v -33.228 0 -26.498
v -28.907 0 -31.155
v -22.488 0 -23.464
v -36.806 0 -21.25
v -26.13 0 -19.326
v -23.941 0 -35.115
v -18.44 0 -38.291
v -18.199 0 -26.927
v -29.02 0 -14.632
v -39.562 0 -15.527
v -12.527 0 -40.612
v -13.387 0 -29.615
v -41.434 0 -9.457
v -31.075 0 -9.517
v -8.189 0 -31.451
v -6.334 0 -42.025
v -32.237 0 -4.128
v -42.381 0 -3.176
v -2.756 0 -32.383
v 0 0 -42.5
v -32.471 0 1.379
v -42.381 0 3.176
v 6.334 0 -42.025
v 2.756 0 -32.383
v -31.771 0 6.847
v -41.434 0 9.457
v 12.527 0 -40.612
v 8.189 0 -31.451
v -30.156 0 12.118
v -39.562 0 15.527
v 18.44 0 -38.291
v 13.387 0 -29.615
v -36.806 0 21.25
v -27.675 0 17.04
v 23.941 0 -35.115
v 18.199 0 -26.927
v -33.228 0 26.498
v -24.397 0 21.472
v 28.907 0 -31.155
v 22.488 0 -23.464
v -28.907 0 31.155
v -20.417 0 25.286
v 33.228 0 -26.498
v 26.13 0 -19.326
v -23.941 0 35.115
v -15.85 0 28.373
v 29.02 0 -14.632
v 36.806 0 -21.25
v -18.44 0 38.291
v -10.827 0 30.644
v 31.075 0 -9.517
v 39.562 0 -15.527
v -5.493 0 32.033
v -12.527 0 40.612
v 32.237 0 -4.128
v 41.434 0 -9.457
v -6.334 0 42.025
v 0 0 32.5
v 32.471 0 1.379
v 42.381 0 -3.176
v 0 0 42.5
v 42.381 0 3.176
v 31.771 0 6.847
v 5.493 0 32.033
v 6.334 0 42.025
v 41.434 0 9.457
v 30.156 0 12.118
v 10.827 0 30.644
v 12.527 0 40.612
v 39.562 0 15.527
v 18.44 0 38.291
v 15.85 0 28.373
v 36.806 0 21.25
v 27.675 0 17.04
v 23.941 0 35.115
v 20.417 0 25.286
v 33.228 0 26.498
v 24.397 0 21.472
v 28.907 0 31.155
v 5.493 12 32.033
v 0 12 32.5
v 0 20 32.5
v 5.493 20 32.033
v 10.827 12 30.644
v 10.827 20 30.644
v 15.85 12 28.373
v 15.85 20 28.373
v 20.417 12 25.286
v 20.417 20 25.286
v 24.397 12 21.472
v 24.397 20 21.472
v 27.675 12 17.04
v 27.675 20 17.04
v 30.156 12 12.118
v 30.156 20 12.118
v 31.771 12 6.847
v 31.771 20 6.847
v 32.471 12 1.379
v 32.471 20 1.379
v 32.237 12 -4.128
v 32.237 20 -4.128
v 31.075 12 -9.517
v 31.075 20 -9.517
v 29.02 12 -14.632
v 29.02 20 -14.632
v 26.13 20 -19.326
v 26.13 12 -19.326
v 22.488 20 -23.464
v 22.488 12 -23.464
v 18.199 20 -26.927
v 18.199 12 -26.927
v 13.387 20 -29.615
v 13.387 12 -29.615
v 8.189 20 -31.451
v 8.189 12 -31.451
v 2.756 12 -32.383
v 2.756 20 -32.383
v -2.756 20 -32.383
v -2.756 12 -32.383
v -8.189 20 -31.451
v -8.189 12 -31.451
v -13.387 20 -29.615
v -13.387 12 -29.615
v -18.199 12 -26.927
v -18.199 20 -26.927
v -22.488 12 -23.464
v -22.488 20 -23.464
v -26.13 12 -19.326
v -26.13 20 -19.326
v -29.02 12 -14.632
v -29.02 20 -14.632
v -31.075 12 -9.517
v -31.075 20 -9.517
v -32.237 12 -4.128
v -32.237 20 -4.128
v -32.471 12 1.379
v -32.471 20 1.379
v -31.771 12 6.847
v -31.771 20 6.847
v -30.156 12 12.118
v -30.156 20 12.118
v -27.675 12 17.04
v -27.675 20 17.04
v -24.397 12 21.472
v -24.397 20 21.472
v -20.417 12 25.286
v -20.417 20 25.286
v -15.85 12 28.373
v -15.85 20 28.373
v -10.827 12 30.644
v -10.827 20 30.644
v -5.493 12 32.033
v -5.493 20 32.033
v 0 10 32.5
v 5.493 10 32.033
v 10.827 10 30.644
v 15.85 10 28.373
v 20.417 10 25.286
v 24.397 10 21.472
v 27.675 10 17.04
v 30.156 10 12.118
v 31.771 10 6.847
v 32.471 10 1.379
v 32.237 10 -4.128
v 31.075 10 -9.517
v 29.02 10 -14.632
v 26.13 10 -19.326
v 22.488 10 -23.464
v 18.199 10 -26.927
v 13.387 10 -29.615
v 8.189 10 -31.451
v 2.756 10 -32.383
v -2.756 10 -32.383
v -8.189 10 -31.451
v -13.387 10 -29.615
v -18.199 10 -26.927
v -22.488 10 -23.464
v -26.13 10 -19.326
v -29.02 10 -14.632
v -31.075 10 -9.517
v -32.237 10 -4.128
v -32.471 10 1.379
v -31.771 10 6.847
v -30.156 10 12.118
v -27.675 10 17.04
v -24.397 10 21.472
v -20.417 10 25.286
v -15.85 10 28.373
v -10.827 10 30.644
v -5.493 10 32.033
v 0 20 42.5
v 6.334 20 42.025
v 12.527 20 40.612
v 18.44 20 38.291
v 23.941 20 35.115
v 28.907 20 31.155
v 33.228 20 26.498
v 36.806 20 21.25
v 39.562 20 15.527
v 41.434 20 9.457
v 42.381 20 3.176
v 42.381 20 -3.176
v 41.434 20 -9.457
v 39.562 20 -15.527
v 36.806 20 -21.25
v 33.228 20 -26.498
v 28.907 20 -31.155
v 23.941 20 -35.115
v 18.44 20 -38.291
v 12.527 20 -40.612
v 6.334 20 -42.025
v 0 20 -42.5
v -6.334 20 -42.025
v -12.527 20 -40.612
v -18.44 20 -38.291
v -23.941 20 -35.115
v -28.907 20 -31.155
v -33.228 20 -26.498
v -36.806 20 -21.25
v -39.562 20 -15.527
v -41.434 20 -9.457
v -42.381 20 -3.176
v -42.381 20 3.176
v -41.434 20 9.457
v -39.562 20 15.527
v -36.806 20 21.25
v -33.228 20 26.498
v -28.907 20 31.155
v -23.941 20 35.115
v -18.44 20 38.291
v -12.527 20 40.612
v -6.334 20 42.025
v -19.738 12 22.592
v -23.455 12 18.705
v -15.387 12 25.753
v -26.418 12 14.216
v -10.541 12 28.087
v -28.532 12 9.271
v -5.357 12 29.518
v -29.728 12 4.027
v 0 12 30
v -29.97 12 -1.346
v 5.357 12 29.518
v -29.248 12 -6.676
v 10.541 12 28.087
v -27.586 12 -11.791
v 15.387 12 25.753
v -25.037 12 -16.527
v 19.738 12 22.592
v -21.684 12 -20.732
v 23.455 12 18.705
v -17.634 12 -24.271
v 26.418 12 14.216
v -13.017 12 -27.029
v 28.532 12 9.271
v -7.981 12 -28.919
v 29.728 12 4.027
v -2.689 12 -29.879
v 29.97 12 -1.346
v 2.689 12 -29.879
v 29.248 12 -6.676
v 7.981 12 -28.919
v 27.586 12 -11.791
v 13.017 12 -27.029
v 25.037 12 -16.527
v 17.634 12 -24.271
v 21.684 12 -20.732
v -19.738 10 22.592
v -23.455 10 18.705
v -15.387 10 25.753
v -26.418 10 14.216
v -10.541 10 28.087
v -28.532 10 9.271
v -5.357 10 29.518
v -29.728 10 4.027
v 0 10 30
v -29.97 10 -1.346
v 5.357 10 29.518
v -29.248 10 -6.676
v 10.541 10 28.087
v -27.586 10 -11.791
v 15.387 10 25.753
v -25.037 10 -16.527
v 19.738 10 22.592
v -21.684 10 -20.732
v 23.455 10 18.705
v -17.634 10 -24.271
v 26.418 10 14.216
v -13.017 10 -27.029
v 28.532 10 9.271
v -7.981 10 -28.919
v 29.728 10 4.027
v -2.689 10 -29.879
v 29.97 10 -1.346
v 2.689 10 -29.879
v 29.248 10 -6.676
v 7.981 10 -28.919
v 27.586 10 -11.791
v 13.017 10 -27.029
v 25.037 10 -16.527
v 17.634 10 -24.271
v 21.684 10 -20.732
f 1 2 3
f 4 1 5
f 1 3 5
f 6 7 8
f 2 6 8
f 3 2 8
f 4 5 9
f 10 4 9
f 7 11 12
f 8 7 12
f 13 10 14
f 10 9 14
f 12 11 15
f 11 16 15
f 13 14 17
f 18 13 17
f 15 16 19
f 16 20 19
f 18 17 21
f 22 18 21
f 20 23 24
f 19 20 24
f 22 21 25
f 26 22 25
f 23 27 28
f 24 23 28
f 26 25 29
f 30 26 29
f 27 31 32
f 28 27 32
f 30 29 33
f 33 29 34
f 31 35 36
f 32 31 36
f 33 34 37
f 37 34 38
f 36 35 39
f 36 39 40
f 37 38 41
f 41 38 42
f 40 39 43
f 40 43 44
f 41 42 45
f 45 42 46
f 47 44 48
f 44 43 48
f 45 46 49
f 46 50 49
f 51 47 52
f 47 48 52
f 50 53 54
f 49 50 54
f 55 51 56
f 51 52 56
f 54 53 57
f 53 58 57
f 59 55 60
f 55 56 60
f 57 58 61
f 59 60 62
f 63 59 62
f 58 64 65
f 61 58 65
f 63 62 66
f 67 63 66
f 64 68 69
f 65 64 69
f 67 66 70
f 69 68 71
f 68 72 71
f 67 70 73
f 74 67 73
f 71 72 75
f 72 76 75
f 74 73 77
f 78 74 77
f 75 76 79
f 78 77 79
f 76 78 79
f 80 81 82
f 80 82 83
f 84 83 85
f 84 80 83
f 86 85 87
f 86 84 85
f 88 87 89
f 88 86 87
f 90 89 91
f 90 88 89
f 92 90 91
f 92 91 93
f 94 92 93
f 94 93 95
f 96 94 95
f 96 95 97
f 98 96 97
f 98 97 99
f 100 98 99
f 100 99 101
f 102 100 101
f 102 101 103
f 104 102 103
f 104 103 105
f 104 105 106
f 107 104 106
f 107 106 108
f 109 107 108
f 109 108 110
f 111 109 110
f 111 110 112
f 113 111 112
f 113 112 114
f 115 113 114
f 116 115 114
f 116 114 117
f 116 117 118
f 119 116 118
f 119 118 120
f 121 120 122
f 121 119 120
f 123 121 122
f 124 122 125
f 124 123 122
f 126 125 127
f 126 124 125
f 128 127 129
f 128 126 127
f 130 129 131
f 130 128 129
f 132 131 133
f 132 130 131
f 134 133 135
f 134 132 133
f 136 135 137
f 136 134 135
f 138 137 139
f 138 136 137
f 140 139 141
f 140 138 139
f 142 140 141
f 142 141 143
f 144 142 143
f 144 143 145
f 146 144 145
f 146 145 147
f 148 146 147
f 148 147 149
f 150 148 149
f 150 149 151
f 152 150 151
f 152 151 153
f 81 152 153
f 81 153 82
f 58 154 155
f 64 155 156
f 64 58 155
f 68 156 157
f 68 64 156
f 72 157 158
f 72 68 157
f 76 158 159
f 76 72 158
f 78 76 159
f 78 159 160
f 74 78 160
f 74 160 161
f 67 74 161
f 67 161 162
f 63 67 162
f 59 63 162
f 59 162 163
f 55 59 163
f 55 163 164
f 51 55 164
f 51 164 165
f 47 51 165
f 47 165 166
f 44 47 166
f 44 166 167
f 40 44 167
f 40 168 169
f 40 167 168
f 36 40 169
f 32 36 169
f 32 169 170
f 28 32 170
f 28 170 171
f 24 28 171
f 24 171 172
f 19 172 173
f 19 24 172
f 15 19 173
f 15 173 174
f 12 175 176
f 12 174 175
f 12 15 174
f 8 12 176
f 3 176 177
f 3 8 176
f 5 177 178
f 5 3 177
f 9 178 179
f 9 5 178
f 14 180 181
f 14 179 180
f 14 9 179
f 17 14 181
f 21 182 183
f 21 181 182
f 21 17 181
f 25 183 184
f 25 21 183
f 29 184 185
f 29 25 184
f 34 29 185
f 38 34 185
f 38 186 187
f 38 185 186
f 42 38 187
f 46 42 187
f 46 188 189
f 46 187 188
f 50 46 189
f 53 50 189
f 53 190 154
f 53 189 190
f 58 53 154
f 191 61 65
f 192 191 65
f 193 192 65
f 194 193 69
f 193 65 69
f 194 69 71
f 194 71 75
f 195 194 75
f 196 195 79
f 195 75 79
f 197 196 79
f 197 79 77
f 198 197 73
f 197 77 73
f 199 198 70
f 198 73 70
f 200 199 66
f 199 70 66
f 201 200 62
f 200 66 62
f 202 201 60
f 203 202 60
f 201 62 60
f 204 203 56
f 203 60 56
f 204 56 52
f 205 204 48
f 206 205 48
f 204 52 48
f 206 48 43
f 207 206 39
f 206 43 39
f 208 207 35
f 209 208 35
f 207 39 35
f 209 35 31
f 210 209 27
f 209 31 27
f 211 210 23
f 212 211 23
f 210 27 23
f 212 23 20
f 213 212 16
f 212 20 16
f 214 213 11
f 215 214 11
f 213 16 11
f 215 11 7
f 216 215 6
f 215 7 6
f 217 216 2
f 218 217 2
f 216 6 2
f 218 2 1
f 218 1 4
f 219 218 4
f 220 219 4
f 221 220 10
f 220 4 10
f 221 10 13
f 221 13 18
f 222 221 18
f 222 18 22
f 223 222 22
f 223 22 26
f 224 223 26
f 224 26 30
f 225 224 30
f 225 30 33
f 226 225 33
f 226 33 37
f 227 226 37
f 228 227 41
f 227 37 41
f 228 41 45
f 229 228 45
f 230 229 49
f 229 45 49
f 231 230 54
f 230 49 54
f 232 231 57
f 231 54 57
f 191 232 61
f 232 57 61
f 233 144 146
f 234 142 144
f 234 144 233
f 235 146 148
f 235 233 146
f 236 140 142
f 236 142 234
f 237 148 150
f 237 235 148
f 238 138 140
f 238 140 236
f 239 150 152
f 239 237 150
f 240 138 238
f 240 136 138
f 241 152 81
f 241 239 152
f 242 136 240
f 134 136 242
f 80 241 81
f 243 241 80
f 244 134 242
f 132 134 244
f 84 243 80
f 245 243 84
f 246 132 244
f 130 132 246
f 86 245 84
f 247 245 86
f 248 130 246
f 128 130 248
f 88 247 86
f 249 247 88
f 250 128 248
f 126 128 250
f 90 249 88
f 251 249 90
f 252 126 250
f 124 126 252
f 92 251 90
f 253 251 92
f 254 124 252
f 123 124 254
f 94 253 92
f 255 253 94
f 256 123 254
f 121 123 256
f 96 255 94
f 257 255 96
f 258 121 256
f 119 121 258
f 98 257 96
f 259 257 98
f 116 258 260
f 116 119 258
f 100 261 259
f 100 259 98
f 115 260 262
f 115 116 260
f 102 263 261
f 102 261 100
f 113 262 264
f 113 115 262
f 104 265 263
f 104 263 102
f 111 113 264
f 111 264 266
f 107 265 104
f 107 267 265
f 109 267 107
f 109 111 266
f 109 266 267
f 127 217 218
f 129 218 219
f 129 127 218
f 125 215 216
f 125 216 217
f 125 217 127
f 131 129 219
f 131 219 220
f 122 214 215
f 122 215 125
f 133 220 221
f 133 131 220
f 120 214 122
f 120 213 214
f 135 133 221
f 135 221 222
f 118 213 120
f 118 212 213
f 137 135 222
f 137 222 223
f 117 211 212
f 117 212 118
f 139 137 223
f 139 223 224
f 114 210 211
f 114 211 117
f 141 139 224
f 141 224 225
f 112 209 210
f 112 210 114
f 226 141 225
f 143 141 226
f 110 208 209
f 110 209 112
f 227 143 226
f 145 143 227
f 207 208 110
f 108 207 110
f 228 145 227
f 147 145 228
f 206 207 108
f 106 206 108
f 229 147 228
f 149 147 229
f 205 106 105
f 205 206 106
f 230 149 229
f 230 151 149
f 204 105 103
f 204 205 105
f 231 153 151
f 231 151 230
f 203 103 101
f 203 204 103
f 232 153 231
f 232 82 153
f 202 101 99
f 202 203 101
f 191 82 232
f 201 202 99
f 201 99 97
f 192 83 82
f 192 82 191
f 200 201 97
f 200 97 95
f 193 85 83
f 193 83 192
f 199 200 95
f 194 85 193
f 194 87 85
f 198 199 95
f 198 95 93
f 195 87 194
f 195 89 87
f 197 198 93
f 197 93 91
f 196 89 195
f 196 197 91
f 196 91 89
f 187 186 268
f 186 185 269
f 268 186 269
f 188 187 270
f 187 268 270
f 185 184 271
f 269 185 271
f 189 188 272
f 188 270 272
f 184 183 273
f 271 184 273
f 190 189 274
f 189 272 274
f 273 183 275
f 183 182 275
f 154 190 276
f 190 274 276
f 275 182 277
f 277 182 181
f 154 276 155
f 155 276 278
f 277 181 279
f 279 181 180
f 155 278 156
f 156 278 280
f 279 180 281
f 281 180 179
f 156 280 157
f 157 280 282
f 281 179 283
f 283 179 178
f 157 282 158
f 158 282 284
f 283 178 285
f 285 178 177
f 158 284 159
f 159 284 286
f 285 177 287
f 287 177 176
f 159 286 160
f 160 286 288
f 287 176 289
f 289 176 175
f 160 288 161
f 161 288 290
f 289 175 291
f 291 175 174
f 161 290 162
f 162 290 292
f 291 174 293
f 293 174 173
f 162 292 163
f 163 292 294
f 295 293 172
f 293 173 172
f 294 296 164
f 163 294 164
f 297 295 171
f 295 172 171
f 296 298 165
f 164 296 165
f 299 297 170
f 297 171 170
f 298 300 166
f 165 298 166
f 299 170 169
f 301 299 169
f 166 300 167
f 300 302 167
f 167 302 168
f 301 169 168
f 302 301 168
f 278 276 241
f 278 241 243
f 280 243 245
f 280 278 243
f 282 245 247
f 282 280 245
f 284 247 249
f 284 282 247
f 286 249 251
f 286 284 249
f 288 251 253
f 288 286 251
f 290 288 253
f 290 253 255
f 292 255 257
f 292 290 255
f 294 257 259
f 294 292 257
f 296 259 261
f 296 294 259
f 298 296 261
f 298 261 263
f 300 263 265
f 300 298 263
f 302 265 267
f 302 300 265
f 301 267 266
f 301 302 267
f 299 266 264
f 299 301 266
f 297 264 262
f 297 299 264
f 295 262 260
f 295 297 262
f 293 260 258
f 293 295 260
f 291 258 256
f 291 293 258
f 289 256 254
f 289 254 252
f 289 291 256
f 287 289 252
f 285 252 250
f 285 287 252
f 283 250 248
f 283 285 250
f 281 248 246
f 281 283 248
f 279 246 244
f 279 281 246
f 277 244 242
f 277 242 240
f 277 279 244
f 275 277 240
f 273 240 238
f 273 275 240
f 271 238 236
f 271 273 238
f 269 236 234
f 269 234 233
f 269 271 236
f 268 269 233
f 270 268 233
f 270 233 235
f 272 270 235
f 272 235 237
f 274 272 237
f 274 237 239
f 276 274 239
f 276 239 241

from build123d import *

# Parameters (mm, degrees)
SKETCH1_R           = 42.5
SKETCH1_R_2         = 32.5
BOSS_EXTRUDE1_DEPTH = 20
SKETCH2_R           = 33
SKETCH2_R_2         = 30
BOSS_EXTRUDE2_DEPTH = 2


with BuildPart() as part:
    # Sketch1 → Boss-Extrude1 (new body)
    with BuildSketch(Plane(origin=(0, 0, 0), x_dir=(1, 0, 0), z_dir=(0, 1, 0))):
        with Locations(Location((0, 0, 0), (0, 0, 270))):
            Circle(SKETCH1_R)
        with Locations(Location((0, 0, 0), (0, 0, 270))):
            Circle(SKETCH1_R_2, mode=Mode.SUBTRACT)
    extrude(amount=BOSS_EXTRUDE1_DEPTH)

    # Sketch2 → Boss-Extrude2 (add)
    with BuildSketch(Plane(origin=(0, 10, 0), x_dir=(1, 0, 0), z_dir=(0, 1, 0))):
        Circle(SKETCH2_R)
        with Locations(Location((0, 0, 0), (0, 0, 270))):
            Circle(SKETCH2_R_2, mode=Mode.SUBTRACT)
    extrude(amount=BOSS_EXTRUDE2_DEPTH)


solid = part.part
